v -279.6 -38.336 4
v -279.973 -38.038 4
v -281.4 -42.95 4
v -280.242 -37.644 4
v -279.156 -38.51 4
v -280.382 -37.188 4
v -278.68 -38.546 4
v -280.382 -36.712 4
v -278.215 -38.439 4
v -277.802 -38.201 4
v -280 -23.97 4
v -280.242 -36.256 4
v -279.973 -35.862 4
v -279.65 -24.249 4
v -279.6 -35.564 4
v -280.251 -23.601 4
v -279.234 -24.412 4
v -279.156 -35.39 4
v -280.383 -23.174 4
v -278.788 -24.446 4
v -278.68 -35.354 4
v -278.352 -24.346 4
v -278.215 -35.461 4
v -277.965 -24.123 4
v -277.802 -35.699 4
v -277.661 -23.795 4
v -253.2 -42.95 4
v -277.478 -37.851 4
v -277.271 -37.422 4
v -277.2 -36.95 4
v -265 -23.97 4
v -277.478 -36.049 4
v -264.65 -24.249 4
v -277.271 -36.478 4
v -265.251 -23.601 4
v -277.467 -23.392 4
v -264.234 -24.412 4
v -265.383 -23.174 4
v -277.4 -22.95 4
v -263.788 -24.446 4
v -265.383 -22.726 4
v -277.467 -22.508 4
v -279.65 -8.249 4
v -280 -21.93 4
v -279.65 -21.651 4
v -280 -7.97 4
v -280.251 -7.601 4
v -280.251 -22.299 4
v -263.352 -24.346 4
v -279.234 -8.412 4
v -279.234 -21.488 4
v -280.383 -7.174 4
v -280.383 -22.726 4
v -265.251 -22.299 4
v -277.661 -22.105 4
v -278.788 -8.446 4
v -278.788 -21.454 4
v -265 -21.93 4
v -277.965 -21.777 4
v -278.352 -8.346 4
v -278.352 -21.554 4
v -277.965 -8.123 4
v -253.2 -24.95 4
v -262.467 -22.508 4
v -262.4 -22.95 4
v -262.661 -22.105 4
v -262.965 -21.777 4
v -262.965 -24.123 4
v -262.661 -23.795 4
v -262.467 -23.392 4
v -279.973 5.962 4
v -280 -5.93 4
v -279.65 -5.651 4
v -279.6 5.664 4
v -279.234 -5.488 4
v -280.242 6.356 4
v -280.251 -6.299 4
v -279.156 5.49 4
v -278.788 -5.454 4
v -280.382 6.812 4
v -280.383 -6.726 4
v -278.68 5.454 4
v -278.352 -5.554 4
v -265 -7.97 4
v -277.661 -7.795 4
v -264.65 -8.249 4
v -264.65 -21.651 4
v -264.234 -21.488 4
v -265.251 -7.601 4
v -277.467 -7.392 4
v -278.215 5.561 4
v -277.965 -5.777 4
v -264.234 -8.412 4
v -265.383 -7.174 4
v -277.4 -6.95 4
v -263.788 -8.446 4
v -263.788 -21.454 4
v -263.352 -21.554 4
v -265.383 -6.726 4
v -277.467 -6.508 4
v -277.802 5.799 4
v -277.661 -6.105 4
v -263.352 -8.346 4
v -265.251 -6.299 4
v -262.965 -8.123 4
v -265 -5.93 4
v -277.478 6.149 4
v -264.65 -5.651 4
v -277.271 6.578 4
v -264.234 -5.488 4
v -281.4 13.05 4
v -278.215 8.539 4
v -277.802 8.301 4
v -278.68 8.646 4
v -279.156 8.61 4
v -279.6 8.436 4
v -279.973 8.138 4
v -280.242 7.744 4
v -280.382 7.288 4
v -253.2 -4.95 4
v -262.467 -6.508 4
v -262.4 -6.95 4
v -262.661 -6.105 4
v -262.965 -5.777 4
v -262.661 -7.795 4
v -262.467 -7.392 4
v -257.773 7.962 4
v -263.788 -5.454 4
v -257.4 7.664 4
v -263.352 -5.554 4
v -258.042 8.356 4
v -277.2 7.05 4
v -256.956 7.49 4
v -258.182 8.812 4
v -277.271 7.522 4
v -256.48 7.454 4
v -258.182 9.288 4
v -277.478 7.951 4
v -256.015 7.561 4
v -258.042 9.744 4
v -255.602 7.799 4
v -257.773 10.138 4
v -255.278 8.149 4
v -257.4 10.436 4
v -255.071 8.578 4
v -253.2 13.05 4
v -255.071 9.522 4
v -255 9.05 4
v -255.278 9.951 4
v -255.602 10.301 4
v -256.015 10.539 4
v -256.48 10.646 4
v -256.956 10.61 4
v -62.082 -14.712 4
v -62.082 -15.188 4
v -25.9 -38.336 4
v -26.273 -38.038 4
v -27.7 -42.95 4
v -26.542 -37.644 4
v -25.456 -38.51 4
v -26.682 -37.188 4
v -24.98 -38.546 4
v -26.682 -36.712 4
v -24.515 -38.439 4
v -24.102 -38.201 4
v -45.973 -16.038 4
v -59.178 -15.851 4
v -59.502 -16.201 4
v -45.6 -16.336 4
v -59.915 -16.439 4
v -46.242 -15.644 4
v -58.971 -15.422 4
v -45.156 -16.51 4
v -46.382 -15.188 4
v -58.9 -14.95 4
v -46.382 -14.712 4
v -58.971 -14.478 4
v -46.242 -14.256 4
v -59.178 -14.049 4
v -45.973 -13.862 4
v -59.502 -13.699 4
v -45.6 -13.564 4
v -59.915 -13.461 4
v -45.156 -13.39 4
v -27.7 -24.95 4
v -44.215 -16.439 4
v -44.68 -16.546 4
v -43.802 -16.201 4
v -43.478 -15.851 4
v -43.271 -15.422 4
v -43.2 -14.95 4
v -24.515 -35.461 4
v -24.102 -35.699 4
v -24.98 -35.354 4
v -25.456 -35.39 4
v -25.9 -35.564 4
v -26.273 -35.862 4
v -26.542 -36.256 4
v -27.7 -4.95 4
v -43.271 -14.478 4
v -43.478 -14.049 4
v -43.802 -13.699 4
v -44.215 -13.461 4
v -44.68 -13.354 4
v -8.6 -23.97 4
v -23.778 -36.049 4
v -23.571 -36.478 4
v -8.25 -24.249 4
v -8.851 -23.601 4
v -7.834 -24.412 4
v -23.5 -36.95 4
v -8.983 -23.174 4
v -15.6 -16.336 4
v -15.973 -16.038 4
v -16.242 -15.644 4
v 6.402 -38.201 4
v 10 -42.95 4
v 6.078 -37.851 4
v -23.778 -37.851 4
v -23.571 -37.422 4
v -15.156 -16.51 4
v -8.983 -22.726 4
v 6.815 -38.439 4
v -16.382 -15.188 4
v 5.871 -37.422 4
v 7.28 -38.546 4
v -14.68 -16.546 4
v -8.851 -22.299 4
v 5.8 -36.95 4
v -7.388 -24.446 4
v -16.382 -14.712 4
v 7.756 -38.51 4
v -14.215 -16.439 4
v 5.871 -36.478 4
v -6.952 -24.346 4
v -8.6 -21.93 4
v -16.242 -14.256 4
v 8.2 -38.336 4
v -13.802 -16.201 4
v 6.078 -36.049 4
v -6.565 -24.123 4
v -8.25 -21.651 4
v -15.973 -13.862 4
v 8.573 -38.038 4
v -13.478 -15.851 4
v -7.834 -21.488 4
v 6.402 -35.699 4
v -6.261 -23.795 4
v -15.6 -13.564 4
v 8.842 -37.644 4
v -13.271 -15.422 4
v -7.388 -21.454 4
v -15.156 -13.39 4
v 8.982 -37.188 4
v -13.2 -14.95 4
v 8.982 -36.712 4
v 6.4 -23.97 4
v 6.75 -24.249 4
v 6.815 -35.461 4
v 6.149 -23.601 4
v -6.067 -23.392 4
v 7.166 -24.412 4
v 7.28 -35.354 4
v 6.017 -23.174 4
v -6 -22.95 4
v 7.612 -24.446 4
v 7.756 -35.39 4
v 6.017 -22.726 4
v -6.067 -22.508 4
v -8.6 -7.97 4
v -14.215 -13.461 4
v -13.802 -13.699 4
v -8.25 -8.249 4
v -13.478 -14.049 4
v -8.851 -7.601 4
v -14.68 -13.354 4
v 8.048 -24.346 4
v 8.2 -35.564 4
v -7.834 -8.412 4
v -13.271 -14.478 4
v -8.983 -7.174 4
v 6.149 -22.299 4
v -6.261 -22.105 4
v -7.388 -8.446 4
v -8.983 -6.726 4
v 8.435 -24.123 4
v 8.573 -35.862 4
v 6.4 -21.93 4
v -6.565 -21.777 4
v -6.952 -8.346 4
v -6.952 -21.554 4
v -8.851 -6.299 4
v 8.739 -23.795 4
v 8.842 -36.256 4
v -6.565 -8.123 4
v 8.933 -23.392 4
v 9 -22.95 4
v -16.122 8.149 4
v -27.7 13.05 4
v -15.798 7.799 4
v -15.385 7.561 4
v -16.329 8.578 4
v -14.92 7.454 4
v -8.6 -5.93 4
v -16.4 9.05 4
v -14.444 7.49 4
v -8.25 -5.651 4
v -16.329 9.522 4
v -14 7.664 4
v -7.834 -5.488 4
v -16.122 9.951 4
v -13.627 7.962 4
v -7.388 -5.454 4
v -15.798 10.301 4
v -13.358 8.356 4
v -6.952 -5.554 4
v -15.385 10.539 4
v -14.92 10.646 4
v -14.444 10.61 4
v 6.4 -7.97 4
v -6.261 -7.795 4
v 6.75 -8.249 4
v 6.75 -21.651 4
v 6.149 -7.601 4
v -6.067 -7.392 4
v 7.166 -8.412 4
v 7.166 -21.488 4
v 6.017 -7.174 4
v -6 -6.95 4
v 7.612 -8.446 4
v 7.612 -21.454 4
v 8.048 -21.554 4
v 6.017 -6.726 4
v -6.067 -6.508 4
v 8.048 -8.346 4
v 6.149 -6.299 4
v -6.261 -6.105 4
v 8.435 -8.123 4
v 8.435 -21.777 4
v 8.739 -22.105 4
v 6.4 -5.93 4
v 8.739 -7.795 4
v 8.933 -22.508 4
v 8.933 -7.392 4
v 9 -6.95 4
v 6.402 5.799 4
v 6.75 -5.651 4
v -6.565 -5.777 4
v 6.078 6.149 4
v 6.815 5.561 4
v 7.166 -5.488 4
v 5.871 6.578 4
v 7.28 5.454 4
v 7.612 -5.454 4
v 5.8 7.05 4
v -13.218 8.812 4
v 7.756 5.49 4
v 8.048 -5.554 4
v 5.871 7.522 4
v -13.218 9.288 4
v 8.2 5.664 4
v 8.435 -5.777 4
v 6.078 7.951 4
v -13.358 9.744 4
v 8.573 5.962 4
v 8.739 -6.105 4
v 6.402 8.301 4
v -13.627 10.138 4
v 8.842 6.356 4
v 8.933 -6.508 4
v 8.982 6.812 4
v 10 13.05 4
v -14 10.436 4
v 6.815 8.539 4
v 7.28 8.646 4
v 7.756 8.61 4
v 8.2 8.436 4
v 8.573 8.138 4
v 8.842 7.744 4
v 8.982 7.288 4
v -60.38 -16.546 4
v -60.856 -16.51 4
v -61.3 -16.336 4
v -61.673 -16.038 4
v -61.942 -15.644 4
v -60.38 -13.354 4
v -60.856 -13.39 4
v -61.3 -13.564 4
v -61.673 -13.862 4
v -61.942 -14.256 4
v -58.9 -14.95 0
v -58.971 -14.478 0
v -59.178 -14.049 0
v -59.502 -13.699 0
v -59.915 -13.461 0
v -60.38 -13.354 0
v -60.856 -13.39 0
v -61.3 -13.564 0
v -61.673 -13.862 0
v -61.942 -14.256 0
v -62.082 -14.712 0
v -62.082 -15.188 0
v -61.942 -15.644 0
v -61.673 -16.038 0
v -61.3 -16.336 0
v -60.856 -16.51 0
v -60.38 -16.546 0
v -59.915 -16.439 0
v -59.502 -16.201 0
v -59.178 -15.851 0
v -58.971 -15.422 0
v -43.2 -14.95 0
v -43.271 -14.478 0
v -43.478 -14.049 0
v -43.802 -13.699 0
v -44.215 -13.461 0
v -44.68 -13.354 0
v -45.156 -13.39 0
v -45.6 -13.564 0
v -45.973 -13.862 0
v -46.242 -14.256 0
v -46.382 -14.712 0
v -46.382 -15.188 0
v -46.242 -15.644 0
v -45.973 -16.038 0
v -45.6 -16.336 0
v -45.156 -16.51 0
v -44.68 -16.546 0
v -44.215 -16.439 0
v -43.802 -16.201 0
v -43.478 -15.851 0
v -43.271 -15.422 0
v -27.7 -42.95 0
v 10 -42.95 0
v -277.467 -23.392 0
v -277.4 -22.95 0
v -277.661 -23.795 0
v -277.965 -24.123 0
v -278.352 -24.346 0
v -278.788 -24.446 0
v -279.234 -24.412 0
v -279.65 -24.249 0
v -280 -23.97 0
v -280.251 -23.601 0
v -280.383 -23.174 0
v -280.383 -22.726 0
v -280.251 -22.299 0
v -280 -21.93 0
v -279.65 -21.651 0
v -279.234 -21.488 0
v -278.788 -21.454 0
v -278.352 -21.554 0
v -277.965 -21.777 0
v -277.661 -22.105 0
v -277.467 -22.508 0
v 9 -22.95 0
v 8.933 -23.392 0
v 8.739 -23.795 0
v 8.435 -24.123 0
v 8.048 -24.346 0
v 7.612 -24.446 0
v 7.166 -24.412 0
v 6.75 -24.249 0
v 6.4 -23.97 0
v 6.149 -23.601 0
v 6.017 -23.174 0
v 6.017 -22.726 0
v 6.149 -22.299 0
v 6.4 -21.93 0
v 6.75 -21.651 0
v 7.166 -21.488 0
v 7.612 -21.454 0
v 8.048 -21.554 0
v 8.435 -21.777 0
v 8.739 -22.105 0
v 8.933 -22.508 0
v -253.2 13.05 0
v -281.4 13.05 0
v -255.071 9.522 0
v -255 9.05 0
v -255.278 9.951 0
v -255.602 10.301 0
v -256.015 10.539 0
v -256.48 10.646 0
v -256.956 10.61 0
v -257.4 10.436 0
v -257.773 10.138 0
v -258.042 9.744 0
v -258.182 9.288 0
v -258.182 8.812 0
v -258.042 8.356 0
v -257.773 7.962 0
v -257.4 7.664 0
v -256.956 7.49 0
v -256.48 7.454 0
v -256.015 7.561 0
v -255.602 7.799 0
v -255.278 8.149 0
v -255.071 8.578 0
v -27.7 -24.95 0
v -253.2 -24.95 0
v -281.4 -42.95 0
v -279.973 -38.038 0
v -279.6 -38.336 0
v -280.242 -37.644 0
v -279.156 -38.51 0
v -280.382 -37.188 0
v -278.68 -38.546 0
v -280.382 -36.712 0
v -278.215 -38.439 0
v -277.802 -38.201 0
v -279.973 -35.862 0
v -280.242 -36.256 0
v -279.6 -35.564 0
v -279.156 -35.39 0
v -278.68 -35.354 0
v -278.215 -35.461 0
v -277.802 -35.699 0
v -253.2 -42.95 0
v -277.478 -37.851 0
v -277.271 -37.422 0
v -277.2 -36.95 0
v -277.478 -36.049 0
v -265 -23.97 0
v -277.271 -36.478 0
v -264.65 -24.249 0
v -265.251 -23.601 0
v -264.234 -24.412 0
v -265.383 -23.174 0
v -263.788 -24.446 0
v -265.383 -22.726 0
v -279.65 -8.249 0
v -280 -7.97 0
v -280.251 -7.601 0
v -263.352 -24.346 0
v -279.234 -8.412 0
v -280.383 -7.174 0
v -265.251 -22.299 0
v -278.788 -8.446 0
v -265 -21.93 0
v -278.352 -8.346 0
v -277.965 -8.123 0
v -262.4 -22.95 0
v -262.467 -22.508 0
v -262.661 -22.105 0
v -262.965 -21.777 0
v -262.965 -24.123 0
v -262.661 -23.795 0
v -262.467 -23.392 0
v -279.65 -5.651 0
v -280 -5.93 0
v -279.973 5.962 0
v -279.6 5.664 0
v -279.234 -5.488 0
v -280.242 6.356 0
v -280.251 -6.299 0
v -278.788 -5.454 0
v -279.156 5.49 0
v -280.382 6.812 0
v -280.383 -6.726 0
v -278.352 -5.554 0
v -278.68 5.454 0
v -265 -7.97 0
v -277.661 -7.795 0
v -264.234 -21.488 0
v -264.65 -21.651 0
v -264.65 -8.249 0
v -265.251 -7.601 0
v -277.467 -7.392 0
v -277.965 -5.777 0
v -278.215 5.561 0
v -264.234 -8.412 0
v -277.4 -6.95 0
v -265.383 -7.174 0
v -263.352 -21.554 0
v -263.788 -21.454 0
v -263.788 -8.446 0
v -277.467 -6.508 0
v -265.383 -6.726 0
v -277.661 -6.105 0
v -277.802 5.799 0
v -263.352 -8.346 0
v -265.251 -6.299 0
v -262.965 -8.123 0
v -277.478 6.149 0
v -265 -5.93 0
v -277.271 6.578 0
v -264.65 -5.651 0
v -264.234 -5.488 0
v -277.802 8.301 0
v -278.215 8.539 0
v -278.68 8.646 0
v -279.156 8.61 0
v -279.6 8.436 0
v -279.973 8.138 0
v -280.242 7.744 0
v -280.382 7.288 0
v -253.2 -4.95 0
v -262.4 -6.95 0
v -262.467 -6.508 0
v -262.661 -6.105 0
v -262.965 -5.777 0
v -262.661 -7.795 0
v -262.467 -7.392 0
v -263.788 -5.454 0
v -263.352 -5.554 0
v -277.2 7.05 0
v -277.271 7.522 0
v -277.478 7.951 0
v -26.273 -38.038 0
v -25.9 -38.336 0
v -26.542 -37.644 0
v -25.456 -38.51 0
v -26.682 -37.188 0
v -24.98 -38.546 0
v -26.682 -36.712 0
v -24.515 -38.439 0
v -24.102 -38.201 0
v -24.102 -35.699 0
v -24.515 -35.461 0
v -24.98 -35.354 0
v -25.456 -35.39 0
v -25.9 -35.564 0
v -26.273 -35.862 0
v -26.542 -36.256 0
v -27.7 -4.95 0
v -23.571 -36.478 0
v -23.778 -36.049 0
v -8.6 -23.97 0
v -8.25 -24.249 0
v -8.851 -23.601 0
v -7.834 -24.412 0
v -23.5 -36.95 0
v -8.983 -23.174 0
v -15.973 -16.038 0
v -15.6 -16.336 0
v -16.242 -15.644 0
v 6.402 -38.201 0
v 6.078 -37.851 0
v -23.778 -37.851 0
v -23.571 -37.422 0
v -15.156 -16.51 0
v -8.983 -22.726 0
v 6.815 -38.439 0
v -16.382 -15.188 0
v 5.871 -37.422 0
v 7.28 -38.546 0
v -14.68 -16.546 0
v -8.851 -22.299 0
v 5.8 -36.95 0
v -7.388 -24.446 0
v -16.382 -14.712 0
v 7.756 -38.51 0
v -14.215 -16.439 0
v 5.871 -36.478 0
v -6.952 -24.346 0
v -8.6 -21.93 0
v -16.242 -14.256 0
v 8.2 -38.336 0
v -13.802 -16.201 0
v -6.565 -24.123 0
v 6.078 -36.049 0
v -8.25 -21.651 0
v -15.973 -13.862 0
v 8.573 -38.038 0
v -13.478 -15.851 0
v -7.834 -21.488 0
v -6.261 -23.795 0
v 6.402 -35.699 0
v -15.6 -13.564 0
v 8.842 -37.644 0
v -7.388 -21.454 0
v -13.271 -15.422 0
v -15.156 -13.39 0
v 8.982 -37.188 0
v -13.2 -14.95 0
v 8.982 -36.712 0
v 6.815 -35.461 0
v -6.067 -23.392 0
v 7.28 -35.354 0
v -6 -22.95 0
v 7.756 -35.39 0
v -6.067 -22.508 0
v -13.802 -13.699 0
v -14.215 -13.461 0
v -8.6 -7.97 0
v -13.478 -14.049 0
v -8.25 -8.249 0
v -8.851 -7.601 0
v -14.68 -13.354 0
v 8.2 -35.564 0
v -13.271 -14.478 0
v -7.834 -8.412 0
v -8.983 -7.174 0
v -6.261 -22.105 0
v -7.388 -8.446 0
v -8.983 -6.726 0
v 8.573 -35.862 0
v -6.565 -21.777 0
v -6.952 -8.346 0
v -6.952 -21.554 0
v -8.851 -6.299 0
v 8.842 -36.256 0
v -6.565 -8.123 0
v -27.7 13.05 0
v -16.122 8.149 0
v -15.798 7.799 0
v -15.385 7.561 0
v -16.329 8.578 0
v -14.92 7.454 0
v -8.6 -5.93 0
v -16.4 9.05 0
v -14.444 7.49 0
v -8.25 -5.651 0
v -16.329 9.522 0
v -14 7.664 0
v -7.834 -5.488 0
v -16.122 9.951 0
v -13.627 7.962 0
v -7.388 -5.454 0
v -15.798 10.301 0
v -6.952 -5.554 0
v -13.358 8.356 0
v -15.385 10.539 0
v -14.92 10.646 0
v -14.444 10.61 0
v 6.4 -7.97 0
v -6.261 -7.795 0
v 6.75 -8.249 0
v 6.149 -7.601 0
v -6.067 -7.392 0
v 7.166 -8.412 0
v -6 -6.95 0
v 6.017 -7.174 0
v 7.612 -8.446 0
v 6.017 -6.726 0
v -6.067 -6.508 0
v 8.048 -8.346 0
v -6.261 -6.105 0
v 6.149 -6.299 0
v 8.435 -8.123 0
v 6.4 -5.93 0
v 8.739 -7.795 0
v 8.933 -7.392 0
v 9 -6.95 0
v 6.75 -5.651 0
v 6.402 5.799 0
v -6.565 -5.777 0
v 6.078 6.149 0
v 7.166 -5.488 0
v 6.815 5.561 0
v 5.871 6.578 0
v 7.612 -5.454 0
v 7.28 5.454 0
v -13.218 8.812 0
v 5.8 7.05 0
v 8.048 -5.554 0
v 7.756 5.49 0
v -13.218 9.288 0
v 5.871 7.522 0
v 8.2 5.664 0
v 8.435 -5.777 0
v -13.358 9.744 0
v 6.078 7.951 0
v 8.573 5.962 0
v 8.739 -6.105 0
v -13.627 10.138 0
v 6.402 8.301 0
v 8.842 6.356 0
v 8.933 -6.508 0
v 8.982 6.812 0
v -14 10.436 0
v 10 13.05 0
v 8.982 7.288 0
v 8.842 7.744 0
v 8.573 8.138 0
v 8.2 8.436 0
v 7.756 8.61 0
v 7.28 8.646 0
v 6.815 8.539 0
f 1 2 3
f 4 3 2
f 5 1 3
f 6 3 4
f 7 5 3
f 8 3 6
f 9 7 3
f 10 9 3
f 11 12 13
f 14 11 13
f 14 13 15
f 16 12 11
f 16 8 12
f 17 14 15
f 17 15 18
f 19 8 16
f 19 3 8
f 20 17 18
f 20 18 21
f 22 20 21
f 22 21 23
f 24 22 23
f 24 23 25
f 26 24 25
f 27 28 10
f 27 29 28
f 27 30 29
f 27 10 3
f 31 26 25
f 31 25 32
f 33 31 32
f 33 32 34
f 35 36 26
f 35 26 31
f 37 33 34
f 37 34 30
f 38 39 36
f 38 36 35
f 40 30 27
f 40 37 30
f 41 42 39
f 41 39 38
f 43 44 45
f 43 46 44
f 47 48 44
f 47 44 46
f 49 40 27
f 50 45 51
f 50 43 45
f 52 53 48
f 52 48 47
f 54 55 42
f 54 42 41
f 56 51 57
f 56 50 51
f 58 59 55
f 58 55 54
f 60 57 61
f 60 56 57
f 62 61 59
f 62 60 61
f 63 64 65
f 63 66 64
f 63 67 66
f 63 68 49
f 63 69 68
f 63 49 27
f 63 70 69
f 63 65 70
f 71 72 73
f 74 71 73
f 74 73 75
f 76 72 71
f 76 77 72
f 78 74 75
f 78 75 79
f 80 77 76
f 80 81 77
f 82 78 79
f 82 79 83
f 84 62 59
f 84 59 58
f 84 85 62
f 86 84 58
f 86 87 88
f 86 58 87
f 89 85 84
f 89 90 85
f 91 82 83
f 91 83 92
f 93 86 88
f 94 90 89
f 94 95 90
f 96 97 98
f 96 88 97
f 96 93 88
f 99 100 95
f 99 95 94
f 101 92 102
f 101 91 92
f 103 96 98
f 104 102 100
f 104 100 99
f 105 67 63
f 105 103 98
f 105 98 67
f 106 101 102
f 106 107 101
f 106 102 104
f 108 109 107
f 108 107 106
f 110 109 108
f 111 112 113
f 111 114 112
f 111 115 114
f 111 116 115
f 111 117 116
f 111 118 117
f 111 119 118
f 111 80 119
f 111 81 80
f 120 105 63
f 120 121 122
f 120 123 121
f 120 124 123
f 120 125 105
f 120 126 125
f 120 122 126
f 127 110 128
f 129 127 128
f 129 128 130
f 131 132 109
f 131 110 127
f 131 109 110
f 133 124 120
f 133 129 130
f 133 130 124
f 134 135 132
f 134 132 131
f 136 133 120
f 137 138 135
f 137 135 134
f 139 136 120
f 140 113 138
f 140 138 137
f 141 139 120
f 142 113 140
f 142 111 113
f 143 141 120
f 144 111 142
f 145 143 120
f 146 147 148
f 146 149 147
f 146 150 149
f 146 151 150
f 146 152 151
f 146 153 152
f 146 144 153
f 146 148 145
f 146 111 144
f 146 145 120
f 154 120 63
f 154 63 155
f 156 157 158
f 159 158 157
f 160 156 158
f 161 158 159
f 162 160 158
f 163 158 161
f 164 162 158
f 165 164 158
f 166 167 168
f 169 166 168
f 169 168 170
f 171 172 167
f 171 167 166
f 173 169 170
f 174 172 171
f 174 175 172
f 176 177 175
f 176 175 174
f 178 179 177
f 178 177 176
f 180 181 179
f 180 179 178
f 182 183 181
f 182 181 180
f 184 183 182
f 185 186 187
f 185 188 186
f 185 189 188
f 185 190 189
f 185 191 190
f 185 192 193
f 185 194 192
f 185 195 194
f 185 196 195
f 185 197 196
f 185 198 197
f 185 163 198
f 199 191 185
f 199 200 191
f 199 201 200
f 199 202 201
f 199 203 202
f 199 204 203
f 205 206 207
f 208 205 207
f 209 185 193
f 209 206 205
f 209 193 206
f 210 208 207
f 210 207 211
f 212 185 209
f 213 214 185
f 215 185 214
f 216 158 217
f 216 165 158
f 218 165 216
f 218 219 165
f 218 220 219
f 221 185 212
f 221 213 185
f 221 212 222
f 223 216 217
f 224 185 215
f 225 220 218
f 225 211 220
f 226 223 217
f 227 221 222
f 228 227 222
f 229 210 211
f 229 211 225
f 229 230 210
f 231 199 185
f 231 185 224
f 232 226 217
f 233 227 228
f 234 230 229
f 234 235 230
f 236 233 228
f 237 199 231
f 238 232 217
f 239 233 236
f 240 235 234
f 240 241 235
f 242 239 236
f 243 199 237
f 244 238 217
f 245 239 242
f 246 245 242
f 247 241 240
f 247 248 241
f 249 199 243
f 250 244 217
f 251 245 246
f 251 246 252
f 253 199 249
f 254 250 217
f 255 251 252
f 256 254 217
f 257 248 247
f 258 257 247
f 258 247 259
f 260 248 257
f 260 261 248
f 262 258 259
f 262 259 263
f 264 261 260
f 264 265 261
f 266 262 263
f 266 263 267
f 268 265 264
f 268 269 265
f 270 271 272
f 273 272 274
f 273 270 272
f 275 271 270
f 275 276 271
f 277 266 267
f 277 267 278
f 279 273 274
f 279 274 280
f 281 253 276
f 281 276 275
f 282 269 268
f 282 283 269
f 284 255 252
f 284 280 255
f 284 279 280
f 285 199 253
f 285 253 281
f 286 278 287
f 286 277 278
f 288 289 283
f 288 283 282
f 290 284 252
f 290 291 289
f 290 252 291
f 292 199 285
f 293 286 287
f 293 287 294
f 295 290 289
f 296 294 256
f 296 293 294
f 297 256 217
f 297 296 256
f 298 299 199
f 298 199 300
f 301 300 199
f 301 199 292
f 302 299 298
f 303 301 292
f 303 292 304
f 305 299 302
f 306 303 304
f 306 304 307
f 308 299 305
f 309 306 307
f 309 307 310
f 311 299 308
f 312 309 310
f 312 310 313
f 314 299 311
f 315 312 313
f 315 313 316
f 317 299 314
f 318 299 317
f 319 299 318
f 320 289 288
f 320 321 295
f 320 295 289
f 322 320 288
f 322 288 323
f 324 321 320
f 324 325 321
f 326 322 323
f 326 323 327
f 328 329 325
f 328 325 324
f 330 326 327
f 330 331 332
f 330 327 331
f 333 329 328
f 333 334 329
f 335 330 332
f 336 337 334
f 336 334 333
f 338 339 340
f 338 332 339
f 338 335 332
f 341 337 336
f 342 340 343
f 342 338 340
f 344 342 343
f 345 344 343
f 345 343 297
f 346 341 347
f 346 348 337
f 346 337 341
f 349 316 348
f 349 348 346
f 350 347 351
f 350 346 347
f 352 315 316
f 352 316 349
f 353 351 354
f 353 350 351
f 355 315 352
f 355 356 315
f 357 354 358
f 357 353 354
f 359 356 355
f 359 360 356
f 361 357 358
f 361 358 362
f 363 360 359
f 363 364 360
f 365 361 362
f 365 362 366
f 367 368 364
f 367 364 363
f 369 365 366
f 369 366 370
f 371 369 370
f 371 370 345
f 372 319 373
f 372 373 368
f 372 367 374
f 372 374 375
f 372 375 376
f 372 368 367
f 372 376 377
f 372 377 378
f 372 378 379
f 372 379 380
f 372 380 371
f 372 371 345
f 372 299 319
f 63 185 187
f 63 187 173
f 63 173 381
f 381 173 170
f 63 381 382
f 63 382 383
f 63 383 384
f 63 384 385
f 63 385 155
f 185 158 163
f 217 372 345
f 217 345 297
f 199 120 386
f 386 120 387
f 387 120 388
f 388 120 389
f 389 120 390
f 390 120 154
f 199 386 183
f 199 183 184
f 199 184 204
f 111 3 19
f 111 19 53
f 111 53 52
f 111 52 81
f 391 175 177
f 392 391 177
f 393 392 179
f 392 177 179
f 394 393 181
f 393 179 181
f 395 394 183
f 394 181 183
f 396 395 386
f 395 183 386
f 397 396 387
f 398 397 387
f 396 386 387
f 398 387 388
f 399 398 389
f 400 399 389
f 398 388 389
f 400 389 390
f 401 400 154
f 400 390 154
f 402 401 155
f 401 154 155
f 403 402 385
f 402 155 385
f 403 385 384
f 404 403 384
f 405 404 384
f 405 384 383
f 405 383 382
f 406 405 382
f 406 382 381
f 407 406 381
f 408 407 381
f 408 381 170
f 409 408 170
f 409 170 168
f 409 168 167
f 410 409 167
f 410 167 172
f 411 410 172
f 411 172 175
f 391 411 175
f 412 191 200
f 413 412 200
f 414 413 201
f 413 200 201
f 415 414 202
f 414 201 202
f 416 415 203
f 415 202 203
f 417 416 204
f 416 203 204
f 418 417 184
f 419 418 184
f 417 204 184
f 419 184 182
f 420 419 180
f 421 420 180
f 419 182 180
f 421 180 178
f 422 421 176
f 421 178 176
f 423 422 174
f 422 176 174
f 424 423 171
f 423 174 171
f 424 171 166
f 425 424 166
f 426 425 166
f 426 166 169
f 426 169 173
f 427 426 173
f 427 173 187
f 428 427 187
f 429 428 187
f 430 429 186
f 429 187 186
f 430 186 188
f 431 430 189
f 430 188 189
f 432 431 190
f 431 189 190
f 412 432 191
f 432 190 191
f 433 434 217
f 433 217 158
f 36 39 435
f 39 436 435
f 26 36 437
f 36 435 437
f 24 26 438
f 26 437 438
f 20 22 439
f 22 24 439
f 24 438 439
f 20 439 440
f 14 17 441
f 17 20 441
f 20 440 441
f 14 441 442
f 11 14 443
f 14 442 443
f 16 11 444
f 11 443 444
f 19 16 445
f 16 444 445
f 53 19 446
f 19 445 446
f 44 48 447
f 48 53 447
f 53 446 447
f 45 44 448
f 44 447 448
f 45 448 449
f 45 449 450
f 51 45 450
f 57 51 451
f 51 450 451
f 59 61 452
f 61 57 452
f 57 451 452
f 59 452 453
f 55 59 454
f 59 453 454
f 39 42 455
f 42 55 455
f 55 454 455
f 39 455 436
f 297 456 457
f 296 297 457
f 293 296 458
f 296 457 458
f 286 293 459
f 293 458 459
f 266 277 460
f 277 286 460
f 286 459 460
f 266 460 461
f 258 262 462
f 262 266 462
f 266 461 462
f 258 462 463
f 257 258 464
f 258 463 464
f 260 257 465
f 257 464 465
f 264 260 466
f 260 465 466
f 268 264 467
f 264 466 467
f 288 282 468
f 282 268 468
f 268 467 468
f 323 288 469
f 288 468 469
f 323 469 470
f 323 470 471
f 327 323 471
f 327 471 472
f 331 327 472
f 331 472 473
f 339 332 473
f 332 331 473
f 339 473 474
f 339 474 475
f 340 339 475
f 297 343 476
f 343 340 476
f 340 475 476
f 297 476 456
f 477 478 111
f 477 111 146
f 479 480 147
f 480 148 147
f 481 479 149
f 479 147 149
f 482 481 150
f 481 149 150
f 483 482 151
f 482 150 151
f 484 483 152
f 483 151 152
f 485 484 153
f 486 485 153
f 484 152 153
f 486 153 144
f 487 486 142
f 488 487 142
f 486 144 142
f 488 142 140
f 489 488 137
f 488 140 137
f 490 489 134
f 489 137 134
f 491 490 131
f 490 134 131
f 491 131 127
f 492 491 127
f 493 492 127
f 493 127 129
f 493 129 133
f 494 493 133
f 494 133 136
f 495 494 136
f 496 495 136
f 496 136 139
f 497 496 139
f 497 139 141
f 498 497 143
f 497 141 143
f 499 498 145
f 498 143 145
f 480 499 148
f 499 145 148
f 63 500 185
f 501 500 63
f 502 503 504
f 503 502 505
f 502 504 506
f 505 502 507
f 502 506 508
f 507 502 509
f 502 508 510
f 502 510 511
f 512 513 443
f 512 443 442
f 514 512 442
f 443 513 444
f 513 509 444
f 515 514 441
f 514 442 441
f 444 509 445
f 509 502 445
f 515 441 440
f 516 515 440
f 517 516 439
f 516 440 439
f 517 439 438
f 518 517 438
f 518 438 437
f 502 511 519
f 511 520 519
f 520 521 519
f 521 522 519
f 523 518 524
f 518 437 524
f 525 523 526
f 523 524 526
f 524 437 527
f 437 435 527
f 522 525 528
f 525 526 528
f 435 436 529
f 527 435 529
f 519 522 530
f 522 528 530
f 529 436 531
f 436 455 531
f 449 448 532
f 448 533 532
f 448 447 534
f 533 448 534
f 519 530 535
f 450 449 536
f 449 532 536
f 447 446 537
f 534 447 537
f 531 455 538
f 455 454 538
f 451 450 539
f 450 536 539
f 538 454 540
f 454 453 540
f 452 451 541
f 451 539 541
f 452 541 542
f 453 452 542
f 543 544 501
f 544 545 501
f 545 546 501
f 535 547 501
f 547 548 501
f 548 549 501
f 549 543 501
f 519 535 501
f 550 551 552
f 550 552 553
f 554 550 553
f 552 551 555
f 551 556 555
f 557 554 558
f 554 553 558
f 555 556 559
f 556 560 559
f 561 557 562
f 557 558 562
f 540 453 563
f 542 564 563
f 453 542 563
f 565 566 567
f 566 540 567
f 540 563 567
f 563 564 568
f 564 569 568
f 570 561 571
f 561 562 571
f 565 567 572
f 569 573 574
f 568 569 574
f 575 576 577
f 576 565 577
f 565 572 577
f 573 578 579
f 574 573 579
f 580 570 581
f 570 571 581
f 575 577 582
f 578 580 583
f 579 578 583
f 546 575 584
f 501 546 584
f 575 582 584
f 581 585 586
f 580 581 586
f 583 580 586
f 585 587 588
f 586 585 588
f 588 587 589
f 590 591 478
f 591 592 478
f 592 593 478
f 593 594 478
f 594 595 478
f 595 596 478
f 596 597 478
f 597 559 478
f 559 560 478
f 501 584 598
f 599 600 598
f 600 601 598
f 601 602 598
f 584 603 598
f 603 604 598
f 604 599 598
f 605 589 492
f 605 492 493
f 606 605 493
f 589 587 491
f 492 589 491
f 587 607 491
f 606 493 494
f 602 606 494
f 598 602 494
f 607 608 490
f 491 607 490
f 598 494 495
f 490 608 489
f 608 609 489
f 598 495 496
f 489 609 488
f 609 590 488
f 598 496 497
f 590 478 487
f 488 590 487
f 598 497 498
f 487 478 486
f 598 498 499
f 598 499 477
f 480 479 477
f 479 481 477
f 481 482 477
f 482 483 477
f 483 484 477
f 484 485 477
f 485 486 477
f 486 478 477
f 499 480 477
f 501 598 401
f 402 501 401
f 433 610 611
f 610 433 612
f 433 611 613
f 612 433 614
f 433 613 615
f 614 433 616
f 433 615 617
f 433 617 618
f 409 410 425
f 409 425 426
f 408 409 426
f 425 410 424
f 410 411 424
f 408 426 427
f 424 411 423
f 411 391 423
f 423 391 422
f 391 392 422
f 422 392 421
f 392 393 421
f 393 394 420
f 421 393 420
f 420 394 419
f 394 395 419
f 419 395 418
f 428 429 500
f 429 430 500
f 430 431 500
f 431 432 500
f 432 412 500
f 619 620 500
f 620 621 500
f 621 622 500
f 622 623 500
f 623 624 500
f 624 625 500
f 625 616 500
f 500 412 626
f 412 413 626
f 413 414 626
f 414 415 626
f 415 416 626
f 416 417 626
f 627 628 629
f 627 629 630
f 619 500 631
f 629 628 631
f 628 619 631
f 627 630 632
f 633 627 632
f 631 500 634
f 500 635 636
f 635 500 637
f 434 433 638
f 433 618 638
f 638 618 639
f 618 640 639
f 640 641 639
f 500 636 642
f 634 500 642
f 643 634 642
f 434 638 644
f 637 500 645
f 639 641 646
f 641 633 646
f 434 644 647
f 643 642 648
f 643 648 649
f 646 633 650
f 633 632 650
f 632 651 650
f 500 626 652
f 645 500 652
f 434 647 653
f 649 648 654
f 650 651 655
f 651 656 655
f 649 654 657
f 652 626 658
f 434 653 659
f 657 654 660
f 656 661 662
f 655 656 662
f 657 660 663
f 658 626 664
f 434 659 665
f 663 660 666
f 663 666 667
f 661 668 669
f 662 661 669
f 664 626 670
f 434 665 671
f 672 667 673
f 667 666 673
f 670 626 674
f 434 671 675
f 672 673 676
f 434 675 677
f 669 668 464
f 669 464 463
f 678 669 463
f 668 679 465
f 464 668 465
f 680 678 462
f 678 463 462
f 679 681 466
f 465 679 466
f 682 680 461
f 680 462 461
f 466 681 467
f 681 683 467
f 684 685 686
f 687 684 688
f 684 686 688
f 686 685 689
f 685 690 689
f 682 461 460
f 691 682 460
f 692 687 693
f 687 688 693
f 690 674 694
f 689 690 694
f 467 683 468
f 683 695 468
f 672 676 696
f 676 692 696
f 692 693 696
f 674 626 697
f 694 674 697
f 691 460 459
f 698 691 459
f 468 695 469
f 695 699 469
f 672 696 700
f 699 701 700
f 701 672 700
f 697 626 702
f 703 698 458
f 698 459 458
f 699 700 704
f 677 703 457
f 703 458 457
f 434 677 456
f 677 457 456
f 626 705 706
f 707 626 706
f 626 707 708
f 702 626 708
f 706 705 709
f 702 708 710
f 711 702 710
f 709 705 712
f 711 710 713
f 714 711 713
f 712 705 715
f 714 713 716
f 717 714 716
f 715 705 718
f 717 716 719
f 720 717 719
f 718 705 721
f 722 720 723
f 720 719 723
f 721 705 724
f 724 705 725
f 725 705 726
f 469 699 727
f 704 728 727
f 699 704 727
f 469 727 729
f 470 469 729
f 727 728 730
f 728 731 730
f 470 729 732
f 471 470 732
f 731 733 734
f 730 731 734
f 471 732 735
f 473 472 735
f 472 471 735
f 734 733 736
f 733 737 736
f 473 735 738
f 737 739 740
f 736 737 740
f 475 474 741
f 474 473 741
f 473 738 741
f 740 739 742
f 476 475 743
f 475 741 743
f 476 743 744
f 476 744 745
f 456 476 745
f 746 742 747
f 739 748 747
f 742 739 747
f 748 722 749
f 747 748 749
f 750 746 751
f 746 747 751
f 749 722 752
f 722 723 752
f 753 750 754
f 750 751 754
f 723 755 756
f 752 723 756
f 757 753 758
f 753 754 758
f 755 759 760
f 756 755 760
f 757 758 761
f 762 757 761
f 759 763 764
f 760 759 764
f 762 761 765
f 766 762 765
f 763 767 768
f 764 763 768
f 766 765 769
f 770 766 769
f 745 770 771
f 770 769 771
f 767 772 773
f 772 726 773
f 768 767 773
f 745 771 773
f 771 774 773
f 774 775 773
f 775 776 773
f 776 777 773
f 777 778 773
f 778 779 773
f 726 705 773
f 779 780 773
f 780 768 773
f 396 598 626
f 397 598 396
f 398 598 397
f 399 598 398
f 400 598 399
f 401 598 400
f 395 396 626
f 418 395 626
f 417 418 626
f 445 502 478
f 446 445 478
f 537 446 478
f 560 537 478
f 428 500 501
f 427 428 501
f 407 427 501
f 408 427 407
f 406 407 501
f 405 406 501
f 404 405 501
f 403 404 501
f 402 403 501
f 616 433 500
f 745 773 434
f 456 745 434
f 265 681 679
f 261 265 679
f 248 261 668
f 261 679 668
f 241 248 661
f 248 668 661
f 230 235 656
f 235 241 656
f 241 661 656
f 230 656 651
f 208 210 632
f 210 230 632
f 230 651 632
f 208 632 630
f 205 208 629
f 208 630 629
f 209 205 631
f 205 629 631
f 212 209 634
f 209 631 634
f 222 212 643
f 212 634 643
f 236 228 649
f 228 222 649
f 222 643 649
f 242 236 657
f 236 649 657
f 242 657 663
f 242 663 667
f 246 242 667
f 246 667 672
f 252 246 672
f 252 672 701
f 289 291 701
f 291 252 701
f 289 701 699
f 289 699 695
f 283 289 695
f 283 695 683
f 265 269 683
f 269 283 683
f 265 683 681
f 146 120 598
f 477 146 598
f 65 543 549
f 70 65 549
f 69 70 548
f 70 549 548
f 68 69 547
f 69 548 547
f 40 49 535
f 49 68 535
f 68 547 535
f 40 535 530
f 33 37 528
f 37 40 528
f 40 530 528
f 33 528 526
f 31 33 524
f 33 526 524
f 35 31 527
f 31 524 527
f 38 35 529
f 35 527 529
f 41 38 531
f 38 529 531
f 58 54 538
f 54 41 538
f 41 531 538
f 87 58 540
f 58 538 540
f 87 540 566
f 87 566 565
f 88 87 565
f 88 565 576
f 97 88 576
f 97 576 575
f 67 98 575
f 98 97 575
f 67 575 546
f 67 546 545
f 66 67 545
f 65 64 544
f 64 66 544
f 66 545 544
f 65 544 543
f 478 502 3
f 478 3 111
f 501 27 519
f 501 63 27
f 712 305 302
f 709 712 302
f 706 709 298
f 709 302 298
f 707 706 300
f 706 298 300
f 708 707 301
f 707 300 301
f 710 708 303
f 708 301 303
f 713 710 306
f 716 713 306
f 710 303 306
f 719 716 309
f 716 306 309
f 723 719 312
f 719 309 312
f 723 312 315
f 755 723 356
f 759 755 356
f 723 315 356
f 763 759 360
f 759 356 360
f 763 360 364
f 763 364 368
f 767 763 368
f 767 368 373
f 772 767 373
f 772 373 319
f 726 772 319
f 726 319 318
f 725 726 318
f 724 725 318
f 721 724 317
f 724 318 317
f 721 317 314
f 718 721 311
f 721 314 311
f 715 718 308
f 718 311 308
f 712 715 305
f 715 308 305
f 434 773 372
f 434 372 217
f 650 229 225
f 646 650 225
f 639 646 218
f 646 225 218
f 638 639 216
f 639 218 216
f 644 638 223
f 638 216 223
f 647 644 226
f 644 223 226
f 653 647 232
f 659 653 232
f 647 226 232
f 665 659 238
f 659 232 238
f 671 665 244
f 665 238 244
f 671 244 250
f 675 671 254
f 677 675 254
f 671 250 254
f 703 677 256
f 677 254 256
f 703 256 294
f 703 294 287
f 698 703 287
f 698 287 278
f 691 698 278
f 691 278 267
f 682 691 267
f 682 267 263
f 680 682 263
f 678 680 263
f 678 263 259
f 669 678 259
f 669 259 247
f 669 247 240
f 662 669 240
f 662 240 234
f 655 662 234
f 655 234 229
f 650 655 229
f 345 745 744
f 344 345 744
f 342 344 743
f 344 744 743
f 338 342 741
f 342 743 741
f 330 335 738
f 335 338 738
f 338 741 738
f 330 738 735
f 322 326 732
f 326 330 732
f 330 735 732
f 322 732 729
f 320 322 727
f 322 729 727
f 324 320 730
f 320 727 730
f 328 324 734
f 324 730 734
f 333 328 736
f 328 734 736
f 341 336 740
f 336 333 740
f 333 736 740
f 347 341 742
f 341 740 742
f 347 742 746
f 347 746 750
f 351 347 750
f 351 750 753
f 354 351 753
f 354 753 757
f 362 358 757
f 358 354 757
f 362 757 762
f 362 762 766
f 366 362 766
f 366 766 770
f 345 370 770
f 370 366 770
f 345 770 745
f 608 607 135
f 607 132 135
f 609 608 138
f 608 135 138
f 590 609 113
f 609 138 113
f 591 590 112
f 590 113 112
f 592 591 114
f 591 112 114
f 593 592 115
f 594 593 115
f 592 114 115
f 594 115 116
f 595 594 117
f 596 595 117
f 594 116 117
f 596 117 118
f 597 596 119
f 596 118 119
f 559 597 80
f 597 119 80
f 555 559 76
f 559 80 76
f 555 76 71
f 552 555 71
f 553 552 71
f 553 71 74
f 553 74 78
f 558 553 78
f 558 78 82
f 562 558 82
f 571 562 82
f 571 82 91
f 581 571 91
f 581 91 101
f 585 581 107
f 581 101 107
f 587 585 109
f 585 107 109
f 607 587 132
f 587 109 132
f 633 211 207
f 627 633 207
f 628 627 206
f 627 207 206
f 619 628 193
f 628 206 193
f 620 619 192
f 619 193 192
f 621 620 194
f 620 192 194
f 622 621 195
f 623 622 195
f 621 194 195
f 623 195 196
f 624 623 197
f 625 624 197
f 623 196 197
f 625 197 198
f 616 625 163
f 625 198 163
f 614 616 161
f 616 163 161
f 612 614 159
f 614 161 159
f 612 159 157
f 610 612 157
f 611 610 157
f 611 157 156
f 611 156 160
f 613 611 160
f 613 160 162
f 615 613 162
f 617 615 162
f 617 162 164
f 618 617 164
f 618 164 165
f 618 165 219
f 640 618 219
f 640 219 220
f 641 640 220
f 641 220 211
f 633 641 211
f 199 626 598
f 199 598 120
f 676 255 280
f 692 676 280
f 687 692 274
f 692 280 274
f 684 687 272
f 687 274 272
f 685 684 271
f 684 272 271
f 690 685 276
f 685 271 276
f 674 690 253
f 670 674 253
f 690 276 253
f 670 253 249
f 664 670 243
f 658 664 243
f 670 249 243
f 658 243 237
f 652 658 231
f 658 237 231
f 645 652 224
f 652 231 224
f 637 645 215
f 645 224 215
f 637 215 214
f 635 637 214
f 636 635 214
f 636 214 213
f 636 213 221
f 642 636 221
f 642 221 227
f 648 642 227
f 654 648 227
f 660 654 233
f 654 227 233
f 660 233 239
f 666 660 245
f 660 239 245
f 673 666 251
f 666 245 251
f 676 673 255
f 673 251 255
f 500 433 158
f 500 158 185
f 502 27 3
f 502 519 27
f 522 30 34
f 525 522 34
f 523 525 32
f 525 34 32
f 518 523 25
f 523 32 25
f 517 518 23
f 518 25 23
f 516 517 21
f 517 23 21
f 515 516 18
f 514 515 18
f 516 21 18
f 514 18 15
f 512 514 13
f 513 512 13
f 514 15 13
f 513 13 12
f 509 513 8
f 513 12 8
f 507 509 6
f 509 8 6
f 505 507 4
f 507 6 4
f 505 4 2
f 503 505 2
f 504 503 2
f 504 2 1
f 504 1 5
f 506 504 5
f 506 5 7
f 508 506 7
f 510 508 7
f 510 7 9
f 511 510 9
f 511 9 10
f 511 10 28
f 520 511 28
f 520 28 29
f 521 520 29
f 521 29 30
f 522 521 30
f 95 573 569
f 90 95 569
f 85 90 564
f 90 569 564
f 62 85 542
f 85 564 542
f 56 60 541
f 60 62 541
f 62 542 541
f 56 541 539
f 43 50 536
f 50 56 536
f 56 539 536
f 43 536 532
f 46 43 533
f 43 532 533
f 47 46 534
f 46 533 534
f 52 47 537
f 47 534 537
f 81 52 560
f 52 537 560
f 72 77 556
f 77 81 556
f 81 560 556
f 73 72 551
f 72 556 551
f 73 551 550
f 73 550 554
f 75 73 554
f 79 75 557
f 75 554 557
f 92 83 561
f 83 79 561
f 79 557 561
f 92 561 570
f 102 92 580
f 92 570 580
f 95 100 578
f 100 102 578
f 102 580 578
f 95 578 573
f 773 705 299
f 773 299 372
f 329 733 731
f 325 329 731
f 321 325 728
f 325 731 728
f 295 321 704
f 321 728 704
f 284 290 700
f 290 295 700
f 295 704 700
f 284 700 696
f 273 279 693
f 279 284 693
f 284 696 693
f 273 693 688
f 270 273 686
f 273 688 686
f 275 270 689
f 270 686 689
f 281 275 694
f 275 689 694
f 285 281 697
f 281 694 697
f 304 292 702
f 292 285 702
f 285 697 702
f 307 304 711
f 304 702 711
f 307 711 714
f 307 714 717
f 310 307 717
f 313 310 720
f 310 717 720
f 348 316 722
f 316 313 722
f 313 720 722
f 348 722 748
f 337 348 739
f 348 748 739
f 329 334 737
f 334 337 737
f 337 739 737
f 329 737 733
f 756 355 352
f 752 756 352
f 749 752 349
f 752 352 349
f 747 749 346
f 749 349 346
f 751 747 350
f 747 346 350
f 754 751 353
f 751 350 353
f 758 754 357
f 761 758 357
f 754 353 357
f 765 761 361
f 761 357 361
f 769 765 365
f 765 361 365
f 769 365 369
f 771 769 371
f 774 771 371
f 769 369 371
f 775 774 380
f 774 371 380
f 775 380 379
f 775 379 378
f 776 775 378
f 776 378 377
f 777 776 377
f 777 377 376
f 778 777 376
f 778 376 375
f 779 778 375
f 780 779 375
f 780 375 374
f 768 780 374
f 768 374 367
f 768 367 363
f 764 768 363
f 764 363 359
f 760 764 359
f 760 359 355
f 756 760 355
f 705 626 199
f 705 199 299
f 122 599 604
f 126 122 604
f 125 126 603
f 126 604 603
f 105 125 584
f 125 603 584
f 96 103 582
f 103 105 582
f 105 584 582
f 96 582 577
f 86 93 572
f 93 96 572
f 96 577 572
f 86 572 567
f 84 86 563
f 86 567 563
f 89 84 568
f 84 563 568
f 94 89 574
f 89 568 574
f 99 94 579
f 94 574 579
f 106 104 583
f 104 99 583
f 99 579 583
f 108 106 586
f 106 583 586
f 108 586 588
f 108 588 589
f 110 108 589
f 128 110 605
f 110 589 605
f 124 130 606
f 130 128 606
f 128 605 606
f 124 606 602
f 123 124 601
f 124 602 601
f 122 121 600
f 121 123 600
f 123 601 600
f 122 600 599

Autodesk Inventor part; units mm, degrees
ref_plane "YZ Plane" through (0, 0, 0) normal (1, 0, 0) x (0, 1, 0)
ref_plane "XZ Plane" through (0, 0, 0) normal (0, 1, 0) x (-1, 0, 0)
ref_plane "XY Plane" through (0, 0, 0) normal (0, 0, 1) x (1, 0, 0)
sketch "Эскиз1" plane through (0, 0, 0) normal (0, 0, 1) x (1, 0, 0)
  circle A0 centre (-7.5, -22.95) radius 1.5 projected
  circle A1 centre (7.5, -22.95) radius 1.5 projected
  circle A2 centre (7.5, -6.95) radius 1.5 projected
  circle A3 centre (-7.5, -6.95) radius 1.5 projected
  line L0 (-281.4, 13.05) -> (10, 13.05)
  line L1 (10, 13.05) -> (10, -42.95)
  line L2 (10, -42.95) -> (-281.4, -42.95)
  line L3 (-281.4, -42.95) -> (-281.4, 13.05)
  line L4 (-281.4, 13.05) -> (10, -42.95) construction
  line L5 (10, 13.05) -> (-281.4, -42.95) construction
  line L6 (-135.7, -14.95) -> (-135.7, -42.95) construction
  circle A4 centre (-263.9, -22.95) radius 1.5
  circle A5 centre (-278.9, -22.95) radius 1.5
  circle A6 centre (-278.9, -6.95) radius 1.5
  circle A7 centre (-263.9, -6.95) radius 1.5
  point P0 (0, 0)
  dimension "d5" = 291.4
  dimension "d8" = 2.5
  dimension "d9" = 20
  dimension "d10" = 20
extrude "Выдавливание1" add sketch "Эскиз1" along normal blind 4
sketch "Эскиз4" plane through (0, 0, 0) normal (0, 0, -1) x (-1, 0, 0)
  line L0 (27.7, 31.05) -> (243.7, 31.05)
  line L1 (243.7, 31.05) -> (243.7, -4.95)
  line L2 (243.7, -4.95) -> (27.7, -4.95)
  line L3 (27.7, -4.95) -> (27.7, 31.05)
  line L4 (-10, 13.05) -> (281.4, 13.05) projected
  line L5 (27.7, 31.05) -> (243.7, -4.95) construction
  line L6 (243.7, 31.05) -> (27.7, -4.95) construction
  point P0 (0, 0)
  point P1 (135.7, 13.05)
  point P2 (243.7, 13.05)
  dimension "d13" = 18
  dimension "d14" = 216
extrude "Выдавливание3" cut sketch "Эскиз4" against normal blind 4
ref_plane "РабПлоскость1" through (-281.4, -14.95, 0) normal (0, -1, 0) x (1, 0, 0)
mirror "Зеркальное отражение1" about plane through (-281.4, -14.95, 0) normal (0, -1, 0) of "Выдавливание3"
sketch "Эскиз8" plane through (0, 0, 4) normal (0, 0, 1) x (1, 0, 0)
  circle A0 centre (-278.8, -36.95) radius 1.6 projected
  line L0 (-243.7, -42.95) -> (-243.7, -24.95) projected
  line L1 (-281.4, -42.95) -> (-243.7, -42.95) projected
  circle A1 centre (-278.8, 7.05) radius 1.6
  point P0 (0, 0)
  dimension "d48" = 3.2
  dimension "d49" = 44
extrude "Выдавливание7" cut sketch "Эскиз8" against normal blind 10
ref_plane "РабПлоскость2" through (-135.7, -42.95, 0) normal (-1, 0, 0) x (0, 0, 1)
mirror "Зеркальное отражение2" about plane through (-135.7, -42.95, 0) normal (-1, 0, 0) of "Выдавливание7"
sketch "Эскиз10" plane through (0, 0, 4) normal (0, 0, 1) x (1, 0, 0)
  circle A0 centre (7.4, -36.95) radius 1.6 projected
  circle A1 centre (-25.1, -36.95) radius 1.6
  point P0 (0, 0)
  dimension "d50" = 3.2
  dimension "d51" = 32.5
extrude "Выдавливание8" cut sketch "Эскиз10" against normal blind 10
sketch "Эскиз11" plane through (0, 0, 4) normal (0, 0, 1) x (1, 0, 0)
  circle A0 centre (-256.6, 9.05) radius 1.6 projected
  point P0 (0, 0)
extrude "Выдавливание9" cut sketch "Эскиз11" against normal blind 10
mirror "Зеркальное отражение4" about plane through (-135.7, -42.95, 0) normal (-1, 0, 0) of "Выдавливание9"
sketch "Эскиз12" plane through (0, 0, 4) normal (0, 0, 1) x (1, 0, 0)
  circle A0 centre (-14.8, -14.95) radius 1.6
  line L0 (-243.7, -24.95) -> (-27.7, -24.95) projected
  circle A1 centre (-14.8, 9.05) radius 1.6 projected
  line L1 (-14.8, -24.95) -> (-14.8, 9.05) construction
  circle A2 centre (-60.5, -14.95) radius 1.6
  circle A3 centre (-44.8, -14.95) radius 1.6 projected
  point P0 (0, 0)
  dimension "d56" = 3.2
  dimension "d57" = 10
  dimension "d58" = 3.2
  dimension "d59" = 45.7
extrude "Выдавливание10" cut sketch "Эскиз12" against normal blind 10 contours A0 | A2 | A3
sketch "Эскиз14" plane through (-243.7, -42.95, 0) normal (1, 0, 0) x (0, 0, -1)
  line L0 (0, 56) -> (0, 38) construction
  line L1 (0, 38) -> (0, 18) construction
  line L2 (0, 18) -> (-4, 18) construction
  line L3 (-4, 0) -> (-4, 18) construction
  line L4 (0, 0) -> (-4, 0) construction
  line L5 (0, 18) -> (0, 0) construction
  line L6 (-4, 56) -> (0, 56) construction
  line L7 (-4, 38) -> (-4, 56) construction
  line L8 (-4, 38) -> (0, 38) construction
  line L9 (-4, 18) -> (-4, 38) construction
  line L10 (-4, 56) -> (0, 56)
  line L11 (0, 56) -> (0, 38)
  line L12 (0, 38) -> (-4, 38)
  line L13 (-4, 38) -> (-4, 56)
  line L14 (-4, 0) -> (-4, 18) projected
  line L15 (0, 18) -> (0, 0) projected
  line L16 (-4, 18) -> (0, 18)
  line L17 (0, 18) -> (0, 0)
  line L18 (0, 0) -> (-4, 0)
  line L19 (-4, 0) -> (-4, 18)
  point P0 (0, 42.95)
  point P1 (0, 18)
extrude "Выдавливание12" cut sketch "Эскиз14" against normal blind 9.5
properties part number "центр_рейка" material "Древесина (береза)"
